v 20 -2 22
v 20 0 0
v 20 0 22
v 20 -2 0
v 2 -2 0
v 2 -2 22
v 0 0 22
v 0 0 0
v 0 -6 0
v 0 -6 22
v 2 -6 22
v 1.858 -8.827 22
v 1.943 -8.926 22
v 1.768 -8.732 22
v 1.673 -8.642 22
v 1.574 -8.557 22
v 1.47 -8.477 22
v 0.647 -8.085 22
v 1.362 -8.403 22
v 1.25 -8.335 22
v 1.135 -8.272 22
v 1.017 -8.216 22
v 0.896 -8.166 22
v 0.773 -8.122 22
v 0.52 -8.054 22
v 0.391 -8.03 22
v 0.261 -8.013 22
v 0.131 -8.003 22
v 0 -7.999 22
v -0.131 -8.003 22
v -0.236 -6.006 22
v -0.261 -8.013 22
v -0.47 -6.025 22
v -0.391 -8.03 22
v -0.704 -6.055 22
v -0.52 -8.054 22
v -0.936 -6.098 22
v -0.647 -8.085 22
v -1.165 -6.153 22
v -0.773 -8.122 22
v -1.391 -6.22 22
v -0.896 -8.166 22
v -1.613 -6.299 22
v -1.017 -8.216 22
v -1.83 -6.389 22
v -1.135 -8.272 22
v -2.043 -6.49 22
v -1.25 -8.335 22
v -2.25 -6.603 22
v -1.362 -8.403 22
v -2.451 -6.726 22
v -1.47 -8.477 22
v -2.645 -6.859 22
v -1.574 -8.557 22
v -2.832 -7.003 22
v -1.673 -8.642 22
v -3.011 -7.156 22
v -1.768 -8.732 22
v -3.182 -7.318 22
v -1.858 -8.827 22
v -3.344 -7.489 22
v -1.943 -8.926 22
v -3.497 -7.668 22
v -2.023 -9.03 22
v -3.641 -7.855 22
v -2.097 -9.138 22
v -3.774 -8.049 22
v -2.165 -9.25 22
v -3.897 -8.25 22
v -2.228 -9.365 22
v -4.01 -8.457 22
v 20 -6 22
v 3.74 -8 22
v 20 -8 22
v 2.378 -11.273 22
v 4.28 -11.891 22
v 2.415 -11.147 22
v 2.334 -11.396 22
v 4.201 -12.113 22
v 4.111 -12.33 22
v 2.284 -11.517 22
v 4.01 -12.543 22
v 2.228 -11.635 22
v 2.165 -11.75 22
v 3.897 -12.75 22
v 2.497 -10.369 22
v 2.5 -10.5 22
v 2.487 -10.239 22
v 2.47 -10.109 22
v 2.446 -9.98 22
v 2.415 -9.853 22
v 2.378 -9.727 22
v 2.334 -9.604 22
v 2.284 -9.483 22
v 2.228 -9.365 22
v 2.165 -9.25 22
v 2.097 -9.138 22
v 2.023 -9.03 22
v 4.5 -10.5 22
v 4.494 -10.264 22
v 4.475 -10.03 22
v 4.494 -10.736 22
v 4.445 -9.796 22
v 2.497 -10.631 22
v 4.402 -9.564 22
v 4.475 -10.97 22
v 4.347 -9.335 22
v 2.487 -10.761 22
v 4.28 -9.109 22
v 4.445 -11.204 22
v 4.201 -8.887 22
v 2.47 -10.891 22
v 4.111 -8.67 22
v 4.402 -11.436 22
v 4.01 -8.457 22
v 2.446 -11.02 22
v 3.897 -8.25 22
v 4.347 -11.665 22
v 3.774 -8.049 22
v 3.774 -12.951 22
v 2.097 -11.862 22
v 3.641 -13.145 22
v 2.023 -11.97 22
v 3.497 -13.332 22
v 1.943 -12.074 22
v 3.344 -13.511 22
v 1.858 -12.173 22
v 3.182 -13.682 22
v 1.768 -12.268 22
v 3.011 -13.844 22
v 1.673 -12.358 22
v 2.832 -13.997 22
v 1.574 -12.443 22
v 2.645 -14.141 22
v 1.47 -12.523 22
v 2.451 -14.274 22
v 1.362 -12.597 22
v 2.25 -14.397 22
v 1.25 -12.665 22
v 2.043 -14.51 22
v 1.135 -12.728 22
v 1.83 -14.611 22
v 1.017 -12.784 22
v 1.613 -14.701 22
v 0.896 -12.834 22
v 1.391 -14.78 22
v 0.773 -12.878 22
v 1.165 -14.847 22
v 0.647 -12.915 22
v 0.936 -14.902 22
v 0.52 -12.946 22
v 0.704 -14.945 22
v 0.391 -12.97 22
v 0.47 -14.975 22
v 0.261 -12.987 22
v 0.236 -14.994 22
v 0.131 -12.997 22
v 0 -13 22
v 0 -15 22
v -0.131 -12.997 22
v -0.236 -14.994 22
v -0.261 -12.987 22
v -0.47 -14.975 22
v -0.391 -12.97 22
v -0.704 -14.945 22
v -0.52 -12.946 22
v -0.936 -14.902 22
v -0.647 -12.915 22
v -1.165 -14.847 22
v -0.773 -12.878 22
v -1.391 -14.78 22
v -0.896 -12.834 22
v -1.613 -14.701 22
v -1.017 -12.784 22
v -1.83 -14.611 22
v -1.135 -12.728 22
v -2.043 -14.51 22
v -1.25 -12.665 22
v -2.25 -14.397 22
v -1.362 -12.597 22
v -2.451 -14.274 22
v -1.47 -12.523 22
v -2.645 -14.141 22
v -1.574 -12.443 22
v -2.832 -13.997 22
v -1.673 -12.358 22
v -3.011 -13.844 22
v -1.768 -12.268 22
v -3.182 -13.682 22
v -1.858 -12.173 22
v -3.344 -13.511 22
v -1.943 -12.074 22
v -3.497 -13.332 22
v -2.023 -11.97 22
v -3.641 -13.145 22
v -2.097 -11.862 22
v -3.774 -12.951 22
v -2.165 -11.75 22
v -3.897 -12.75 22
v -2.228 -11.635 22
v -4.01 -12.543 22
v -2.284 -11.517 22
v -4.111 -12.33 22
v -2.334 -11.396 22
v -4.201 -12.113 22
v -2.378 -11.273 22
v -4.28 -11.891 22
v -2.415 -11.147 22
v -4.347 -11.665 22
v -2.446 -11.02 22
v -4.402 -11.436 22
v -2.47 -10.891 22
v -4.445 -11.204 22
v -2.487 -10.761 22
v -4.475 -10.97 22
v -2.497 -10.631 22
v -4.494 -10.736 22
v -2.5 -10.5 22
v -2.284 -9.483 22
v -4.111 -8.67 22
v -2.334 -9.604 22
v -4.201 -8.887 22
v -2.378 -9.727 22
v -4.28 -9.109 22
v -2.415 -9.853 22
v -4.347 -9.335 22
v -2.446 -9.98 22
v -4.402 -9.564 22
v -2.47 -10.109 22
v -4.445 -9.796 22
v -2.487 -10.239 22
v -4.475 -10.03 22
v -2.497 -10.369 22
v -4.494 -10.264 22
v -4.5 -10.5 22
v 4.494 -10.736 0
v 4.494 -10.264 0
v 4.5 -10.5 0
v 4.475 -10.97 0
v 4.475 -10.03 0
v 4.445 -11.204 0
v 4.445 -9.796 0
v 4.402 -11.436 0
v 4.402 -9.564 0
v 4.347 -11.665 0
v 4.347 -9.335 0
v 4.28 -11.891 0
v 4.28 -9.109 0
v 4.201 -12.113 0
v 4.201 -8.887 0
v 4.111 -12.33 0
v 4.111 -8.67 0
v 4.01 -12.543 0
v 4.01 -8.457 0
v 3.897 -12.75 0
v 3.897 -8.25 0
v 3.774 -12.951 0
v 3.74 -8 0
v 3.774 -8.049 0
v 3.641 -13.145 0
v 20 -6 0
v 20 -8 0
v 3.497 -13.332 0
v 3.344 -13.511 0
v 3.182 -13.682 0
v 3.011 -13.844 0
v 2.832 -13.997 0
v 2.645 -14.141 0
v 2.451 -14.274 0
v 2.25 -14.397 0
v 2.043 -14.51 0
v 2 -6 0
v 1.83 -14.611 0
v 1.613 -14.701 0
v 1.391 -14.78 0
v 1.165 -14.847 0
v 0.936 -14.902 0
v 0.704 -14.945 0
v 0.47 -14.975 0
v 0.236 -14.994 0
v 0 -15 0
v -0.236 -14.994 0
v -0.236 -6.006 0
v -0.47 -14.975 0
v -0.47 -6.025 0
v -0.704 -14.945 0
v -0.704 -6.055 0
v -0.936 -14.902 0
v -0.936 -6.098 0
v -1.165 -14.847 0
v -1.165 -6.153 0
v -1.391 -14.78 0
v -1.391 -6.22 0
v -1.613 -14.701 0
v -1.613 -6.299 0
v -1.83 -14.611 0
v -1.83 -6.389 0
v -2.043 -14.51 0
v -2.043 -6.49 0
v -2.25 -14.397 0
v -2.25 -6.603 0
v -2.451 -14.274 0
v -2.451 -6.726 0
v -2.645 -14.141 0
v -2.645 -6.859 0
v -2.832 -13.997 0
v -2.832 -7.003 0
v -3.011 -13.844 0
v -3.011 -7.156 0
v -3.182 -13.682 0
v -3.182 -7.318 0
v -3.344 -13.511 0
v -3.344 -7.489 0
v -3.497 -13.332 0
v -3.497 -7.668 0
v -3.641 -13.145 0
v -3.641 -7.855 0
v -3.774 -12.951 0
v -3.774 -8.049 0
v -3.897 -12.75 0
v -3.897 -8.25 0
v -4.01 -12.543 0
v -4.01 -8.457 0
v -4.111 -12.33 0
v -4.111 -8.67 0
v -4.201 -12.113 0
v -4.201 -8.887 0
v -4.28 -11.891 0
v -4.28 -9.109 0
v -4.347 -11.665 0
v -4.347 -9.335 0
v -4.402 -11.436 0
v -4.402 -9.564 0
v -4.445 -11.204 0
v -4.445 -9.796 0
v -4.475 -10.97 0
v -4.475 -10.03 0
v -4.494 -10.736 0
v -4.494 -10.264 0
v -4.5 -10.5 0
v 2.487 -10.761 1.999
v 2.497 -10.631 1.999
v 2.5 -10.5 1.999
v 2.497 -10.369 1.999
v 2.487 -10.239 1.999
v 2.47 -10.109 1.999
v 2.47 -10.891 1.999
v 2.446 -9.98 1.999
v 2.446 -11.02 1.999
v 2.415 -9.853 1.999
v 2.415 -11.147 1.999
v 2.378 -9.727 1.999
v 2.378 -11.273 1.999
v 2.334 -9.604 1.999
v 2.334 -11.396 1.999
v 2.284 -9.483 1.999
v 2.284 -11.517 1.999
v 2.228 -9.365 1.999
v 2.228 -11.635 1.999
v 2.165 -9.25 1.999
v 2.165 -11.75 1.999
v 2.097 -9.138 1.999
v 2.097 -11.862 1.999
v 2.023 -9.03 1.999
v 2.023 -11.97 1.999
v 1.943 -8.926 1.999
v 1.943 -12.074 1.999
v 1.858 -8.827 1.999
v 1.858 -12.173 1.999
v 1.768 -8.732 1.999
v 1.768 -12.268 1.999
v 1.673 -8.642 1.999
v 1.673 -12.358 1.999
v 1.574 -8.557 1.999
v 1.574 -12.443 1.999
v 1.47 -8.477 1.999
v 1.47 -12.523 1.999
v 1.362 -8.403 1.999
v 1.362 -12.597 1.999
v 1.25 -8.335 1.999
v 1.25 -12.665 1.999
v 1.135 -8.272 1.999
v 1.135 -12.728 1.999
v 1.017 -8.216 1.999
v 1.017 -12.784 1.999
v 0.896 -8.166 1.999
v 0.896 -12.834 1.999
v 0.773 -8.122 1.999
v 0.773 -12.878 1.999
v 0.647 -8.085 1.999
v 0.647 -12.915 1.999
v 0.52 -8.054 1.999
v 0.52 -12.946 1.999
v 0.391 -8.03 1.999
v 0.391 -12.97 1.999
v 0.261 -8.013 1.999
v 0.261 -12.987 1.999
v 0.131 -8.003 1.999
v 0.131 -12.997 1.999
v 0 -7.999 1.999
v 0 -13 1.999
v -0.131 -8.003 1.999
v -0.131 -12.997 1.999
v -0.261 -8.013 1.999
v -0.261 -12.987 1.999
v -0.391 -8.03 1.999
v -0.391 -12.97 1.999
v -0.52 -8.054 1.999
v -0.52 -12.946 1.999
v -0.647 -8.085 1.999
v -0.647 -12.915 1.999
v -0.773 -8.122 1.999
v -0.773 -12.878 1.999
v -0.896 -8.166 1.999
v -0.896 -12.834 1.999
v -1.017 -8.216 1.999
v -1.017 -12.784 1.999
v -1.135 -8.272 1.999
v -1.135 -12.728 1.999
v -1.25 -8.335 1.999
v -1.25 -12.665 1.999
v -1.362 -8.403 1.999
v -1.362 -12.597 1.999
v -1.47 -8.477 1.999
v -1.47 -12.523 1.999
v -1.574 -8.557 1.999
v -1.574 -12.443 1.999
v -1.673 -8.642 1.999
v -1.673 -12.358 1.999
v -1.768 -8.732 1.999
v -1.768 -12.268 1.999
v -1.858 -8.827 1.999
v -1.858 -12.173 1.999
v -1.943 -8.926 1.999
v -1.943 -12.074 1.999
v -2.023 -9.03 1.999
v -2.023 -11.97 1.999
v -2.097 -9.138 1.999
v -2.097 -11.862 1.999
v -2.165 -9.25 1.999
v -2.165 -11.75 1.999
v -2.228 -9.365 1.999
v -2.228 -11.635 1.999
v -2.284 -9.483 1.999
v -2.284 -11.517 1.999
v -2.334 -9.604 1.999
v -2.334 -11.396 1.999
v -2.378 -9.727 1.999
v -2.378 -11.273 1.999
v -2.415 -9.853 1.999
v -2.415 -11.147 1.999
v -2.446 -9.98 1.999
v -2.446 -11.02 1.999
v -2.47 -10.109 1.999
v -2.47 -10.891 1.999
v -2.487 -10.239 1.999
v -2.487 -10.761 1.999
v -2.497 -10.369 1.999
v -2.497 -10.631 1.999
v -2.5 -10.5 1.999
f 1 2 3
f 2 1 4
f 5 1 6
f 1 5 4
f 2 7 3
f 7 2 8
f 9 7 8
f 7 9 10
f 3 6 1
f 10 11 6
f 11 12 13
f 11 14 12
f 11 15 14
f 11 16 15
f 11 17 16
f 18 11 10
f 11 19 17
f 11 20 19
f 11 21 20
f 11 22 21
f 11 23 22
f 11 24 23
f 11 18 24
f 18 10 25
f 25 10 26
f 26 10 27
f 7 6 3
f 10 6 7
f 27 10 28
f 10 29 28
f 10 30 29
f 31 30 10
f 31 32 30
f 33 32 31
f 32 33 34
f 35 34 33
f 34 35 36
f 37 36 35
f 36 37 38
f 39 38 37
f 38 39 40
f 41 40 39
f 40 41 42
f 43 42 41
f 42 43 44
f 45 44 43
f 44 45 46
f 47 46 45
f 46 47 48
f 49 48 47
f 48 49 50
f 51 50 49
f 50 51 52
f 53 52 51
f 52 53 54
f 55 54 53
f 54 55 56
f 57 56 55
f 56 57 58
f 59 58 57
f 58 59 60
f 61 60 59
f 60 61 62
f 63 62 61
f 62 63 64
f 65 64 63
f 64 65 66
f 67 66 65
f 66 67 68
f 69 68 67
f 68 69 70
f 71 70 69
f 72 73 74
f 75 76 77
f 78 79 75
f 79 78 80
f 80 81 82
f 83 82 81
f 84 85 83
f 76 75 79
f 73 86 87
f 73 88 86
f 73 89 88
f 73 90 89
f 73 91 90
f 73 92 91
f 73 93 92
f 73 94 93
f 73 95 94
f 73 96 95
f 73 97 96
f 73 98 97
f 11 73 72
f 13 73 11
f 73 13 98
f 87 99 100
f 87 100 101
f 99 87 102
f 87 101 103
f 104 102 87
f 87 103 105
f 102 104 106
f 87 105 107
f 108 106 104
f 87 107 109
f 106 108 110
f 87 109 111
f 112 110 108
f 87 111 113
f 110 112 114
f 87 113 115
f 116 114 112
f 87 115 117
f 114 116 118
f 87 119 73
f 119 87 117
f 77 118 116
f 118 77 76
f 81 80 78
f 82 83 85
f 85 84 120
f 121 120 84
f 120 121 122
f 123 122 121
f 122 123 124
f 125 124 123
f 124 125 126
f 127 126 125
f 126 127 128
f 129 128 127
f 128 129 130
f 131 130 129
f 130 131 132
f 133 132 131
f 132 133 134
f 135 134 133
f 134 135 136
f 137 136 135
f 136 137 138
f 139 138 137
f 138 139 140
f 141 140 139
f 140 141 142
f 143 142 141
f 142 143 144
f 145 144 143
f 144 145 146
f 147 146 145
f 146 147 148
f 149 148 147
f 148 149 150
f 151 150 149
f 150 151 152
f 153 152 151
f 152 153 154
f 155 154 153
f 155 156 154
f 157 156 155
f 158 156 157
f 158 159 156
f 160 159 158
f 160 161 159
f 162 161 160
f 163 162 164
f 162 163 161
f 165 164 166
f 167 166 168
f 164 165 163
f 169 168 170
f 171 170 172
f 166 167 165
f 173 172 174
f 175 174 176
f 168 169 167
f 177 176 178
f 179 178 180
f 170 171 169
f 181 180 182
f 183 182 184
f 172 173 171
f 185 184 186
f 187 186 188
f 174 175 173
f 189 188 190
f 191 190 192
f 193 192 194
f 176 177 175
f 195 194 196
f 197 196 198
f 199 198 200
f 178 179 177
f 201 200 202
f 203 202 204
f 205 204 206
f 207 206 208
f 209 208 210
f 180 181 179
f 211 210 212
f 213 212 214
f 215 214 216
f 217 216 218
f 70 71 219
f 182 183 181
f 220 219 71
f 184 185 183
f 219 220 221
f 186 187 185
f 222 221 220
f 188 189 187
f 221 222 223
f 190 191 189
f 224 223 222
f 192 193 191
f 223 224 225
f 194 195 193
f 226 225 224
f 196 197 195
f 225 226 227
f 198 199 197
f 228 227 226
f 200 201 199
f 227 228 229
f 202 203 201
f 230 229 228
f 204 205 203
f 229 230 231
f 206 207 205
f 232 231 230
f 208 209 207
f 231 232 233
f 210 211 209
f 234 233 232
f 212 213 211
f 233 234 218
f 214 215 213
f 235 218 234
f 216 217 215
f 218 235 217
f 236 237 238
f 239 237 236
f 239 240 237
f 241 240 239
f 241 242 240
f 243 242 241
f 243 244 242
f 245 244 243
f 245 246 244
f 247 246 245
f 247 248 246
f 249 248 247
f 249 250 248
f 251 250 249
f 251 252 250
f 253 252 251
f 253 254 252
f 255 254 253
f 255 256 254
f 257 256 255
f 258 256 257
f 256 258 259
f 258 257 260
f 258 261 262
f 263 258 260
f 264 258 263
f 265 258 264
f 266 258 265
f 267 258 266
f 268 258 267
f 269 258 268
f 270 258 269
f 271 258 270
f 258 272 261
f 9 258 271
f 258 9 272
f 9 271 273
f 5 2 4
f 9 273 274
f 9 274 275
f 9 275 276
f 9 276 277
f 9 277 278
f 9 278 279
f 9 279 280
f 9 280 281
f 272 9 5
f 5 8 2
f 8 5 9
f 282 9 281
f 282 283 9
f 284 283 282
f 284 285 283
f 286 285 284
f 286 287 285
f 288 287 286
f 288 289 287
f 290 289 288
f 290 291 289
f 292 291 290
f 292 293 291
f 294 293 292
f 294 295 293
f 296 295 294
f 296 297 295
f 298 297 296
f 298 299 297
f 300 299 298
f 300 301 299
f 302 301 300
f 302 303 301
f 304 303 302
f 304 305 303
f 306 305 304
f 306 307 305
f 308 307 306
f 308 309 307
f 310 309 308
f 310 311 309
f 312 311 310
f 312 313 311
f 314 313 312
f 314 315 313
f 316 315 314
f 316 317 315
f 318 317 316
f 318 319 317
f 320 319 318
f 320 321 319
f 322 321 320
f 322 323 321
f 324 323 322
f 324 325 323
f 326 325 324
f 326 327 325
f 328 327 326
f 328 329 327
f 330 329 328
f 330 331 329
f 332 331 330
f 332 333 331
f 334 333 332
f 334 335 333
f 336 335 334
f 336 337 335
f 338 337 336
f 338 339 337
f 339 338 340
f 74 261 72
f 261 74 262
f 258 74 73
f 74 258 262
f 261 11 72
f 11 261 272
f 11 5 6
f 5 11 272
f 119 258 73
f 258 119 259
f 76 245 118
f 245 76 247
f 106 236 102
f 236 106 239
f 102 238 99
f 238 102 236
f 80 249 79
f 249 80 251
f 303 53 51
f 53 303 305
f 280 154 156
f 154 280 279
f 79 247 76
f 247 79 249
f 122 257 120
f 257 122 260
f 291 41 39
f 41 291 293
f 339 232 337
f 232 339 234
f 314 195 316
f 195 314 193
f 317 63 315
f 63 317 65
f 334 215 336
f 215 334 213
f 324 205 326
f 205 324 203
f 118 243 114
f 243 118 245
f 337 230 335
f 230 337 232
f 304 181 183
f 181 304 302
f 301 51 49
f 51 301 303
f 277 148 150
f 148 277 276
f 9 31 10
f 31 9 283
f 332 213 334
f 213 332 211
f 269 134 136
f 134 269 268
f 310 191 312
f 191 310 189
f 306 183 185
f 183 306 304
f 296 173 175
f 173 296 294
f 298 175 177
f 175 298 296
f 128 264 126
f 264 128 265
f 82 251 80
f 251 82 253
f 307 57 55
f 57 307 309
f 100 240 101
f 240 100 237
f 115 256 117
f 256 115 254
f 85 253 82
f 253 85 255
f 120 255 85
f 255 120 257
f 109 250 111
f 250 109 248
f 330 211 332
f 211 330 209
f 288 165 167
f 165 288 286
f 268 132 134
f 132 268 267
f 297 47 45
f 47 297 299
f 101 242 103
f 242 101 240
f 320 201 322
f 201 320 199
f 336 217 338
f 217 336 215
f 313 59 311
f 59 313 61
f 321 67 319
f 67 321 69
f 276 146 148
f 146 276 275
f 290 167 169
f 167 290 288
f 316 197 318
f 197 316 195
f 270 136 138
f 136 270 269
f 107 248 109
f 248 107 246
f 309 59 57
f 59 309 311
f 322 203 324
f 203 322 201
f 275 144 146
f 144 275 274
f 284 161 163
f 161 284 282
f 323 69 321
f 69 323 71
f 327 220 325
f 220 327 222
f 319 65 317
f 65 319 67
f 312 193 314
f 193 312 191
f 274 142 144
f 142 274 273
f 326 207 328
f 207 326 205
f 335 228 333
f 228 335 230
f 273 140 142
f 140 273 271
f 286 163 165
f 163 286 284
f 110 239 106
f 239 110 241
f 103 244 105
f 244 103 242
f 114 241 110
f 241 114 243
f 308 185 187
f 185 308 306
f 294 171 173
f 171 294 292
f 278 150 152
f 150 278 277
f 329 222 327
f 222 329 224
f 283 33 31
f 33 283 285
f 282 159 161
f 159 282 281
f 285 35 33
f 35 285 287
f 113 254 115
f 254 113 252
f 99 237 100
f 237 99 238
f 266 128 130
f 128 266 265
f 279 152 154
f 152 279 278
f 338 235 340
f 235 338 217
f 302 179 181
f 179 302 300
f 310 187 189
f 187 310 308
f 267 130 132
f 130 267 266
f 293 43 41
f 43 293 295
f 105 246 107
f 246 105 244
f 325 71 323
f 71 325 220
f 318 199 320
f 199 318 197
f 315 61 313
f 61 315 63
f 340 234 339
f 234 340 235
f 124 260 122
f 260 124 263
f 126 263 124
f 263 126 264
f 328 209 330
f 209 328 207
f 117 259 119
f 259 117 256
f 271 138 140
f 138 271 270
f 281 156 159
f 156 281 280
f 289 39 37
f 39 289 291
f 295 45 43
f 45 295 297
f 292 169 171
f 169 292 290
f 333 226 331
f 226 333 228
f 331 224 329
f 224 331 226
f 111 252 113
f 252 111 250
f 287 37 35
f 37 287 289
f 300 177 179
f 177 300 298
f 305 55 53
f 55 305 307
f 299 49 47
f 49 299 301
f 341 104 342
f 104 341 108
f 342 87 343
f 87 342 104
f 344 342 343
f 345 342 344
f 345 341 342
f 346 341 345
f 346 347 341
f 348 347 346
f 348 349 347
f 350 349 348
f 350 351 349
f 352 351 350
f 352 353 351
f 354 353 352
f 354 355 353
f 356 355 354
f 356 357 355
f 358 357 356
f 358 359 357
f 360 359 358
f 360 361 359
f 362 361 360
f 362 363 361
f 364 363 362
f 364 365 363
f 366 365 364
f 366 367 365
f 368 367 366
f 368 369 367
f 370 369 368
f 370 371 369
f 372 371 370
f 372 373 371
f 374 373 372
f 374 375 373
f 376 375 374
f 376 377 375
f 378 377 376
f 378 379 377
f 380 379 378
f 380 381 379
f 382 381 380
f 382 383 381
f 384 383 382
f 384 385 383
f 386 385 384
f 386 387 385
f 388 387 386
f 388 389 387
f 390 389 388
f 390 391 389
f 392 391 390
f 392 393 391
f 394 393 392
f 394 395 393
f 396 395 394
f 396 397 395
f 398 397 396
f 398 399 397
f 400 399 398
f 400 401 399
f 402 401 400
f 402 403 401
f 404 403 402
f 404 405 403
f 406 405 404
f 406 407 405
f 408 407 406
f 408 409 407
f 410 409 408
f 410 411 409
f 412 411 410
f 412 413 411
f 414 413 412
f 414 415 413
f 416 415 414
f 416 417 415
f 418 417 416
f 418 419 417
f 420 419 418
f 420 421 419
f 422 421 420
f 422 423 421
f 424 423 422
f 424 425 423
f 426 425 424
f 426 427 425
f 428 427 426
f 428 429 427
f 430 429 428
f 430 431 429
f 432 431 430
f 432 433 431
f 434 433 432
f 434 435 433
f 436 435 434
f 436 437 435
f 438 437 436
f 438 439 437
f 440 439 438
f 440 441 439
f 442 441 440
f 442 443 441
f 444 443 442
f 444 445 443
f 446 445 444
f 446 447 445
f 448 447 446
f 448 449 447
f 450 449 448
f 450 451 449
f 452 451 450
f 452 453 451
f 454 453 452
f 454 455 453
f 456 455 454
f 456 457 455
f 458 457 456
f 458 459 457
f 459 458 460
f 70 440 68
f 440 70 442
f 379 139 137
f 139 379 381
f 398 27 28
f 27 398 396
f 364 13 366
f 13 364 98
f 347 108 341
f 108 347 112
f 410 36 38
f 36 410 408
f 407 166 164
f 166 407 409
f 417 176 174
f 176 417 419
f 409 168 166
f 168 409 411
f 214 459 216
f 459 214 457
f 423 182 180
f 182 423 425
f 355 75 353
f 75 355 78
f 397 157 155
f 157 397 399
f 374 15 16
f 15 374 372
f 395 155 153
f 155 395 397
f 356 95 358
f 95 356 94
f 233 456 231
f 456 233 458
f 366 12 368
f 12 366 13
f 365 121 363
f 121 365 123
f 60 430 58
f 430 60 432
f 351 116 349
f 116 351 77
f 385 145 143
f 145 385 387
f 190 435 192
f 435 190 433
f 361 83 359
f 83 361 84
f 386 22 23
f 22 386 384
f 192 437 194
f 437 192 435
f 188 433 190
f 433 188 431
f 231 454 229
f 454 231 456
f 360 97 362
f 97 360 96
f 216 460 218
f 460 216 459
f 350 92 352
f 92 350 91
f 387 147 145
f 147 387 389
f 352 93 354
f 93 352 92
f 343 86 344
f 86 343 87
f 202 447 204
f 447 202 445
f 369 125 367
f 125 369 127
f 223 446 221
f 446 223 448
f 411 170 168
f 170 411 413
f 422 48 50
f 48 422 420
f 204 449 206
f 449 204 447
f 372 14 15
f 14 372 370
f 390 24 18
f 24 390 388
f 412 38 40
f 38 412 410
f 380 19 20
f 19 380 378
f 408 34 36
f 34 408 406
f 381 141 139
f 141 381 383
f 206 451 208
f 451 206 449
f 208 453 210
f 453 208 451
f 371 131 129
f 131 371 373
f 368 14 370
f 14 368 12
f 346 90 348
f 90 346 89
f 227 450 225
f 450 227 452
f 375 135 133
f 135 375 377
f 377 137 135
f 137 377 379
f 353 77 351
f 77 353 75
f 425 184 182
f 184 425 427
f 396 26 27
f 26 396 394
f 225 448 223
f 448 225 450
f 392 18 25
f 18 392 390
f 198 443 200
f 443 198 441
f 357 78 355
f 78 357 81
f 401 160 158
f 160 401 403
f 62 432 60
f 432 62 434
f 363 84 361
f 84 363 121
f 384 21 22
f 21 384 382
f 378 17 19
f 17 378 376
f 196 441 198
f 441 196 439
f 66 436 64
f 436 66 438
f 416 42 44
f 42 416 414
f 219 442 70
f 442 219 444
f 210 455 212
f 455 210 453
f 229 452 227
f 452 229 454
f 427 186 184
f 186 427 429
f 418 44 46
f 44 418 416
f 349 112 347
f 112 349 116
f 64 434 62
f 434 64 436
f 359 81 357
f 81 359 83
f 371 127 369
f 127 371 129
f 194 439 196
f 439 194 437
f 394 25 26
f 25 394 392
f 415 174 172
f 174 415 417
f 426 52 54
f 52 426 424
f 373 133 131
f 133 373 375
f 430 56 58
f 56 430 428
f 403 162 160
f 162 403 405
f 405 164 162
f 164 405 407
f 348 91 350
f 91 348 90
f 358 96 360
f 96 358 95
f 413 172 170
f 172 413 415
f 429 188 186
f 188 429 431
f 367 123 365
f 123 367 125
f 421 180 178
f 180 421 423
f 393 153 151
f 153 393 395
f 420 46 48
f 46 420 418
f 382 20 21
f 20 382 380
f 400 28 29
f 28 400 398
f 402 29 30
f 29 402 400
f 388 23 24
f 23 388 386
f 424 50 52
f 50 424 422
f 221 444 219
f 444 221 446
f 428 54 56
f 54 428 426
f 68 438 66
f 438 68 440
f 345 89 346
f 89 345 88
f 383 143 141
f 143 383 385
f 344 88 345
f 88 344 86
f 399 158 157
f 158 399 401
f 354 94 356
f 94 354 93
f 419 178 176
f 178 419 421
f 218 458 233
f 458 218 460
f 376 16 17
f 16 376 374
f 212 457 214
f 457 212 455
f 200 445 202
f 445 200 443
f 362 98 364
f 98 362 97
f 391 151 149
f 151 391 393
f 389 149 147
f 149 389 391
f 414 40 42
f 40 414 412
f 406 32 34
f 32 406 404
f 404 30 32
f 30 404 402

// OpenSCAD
$fn = $preview ? 30 : 120;
epsilon = 0.001;

pin_hole = 5;
pin_mount = 4;
pin_length = 20;
depth = 20;
width = pin_length + (pin_mount/2);
glass_thickness = 4;
hinge_gap = 0.5;

module pin_holder() {
    difference() {
        translate([0,0,(pin_hole + pin_mount)/2])
            rotate([90, 0, 0])
                cylinder(h = pin_length+(pin_mount/2), d = pin_hole + pin_mount, center = false);
        translate([0,0,(pin_hole + pin_mount)/2])
            rotate([90, 0, 0])
                cylinder(h = pin_length + epsilon, d = pin_hole + epsilon, center = false);
    }
}

module glass_clamp() {
    translate([0, -width, 0])
        cube([depth, width, 2]);
    translate([0, -width, 2 + glass_thickness])
        cube([depth, width, 2]);
    translate([0, -width, 0])
        cube([2, width, 4 + glass_thickness]);
}

module pin_holder_stand_in() {
    translate([0,0,(pin_hole + pin_mount)/2])
        rotate([90, 0, 0])
            cylinder(h = pin_length+(pin_mount/2), d = pin_hole + pin_mount, center = false);
}

module curve() {
    difference() {
        translate([0,0,height/2])
            cube([width*2, depth, height], center = true);
        cylinder(height + epsilon, d = depth + epsilon, center = false);
    }
}

module topFillet() {
    difference() {
        cube([4, depth, 4]);
        translate([0, (depth/2)+1, 0])
            rotate([90, 0, 0])
                cylinder(depth+2, d = 4 + epsilon, center = true);
    }
}

module bottomFillet() {
    difference() {
        cube([4, depth, 4]);
        translate([0, (depth/2)+1, 4])
            rotate([90, 0, 0])
                cylinder(depth+2, d = 4 + epsilon, center = true);
    }
}

translate([0, 0, width])
rotate([90, 0 , 0]) {
    difference() {
        glass_clamp();
        translate([0, 0, 2 + glass_thickness])
            pin_holder_stand_in();
    }
    translate([0, 0, 2 + glass_thickness])
        pin_holder();
}

//TODO: remove the double translate
//TODO: chamfer everything
//TODO: add flag for other hinge side
//TODO: other hinge side needs air hole thing
